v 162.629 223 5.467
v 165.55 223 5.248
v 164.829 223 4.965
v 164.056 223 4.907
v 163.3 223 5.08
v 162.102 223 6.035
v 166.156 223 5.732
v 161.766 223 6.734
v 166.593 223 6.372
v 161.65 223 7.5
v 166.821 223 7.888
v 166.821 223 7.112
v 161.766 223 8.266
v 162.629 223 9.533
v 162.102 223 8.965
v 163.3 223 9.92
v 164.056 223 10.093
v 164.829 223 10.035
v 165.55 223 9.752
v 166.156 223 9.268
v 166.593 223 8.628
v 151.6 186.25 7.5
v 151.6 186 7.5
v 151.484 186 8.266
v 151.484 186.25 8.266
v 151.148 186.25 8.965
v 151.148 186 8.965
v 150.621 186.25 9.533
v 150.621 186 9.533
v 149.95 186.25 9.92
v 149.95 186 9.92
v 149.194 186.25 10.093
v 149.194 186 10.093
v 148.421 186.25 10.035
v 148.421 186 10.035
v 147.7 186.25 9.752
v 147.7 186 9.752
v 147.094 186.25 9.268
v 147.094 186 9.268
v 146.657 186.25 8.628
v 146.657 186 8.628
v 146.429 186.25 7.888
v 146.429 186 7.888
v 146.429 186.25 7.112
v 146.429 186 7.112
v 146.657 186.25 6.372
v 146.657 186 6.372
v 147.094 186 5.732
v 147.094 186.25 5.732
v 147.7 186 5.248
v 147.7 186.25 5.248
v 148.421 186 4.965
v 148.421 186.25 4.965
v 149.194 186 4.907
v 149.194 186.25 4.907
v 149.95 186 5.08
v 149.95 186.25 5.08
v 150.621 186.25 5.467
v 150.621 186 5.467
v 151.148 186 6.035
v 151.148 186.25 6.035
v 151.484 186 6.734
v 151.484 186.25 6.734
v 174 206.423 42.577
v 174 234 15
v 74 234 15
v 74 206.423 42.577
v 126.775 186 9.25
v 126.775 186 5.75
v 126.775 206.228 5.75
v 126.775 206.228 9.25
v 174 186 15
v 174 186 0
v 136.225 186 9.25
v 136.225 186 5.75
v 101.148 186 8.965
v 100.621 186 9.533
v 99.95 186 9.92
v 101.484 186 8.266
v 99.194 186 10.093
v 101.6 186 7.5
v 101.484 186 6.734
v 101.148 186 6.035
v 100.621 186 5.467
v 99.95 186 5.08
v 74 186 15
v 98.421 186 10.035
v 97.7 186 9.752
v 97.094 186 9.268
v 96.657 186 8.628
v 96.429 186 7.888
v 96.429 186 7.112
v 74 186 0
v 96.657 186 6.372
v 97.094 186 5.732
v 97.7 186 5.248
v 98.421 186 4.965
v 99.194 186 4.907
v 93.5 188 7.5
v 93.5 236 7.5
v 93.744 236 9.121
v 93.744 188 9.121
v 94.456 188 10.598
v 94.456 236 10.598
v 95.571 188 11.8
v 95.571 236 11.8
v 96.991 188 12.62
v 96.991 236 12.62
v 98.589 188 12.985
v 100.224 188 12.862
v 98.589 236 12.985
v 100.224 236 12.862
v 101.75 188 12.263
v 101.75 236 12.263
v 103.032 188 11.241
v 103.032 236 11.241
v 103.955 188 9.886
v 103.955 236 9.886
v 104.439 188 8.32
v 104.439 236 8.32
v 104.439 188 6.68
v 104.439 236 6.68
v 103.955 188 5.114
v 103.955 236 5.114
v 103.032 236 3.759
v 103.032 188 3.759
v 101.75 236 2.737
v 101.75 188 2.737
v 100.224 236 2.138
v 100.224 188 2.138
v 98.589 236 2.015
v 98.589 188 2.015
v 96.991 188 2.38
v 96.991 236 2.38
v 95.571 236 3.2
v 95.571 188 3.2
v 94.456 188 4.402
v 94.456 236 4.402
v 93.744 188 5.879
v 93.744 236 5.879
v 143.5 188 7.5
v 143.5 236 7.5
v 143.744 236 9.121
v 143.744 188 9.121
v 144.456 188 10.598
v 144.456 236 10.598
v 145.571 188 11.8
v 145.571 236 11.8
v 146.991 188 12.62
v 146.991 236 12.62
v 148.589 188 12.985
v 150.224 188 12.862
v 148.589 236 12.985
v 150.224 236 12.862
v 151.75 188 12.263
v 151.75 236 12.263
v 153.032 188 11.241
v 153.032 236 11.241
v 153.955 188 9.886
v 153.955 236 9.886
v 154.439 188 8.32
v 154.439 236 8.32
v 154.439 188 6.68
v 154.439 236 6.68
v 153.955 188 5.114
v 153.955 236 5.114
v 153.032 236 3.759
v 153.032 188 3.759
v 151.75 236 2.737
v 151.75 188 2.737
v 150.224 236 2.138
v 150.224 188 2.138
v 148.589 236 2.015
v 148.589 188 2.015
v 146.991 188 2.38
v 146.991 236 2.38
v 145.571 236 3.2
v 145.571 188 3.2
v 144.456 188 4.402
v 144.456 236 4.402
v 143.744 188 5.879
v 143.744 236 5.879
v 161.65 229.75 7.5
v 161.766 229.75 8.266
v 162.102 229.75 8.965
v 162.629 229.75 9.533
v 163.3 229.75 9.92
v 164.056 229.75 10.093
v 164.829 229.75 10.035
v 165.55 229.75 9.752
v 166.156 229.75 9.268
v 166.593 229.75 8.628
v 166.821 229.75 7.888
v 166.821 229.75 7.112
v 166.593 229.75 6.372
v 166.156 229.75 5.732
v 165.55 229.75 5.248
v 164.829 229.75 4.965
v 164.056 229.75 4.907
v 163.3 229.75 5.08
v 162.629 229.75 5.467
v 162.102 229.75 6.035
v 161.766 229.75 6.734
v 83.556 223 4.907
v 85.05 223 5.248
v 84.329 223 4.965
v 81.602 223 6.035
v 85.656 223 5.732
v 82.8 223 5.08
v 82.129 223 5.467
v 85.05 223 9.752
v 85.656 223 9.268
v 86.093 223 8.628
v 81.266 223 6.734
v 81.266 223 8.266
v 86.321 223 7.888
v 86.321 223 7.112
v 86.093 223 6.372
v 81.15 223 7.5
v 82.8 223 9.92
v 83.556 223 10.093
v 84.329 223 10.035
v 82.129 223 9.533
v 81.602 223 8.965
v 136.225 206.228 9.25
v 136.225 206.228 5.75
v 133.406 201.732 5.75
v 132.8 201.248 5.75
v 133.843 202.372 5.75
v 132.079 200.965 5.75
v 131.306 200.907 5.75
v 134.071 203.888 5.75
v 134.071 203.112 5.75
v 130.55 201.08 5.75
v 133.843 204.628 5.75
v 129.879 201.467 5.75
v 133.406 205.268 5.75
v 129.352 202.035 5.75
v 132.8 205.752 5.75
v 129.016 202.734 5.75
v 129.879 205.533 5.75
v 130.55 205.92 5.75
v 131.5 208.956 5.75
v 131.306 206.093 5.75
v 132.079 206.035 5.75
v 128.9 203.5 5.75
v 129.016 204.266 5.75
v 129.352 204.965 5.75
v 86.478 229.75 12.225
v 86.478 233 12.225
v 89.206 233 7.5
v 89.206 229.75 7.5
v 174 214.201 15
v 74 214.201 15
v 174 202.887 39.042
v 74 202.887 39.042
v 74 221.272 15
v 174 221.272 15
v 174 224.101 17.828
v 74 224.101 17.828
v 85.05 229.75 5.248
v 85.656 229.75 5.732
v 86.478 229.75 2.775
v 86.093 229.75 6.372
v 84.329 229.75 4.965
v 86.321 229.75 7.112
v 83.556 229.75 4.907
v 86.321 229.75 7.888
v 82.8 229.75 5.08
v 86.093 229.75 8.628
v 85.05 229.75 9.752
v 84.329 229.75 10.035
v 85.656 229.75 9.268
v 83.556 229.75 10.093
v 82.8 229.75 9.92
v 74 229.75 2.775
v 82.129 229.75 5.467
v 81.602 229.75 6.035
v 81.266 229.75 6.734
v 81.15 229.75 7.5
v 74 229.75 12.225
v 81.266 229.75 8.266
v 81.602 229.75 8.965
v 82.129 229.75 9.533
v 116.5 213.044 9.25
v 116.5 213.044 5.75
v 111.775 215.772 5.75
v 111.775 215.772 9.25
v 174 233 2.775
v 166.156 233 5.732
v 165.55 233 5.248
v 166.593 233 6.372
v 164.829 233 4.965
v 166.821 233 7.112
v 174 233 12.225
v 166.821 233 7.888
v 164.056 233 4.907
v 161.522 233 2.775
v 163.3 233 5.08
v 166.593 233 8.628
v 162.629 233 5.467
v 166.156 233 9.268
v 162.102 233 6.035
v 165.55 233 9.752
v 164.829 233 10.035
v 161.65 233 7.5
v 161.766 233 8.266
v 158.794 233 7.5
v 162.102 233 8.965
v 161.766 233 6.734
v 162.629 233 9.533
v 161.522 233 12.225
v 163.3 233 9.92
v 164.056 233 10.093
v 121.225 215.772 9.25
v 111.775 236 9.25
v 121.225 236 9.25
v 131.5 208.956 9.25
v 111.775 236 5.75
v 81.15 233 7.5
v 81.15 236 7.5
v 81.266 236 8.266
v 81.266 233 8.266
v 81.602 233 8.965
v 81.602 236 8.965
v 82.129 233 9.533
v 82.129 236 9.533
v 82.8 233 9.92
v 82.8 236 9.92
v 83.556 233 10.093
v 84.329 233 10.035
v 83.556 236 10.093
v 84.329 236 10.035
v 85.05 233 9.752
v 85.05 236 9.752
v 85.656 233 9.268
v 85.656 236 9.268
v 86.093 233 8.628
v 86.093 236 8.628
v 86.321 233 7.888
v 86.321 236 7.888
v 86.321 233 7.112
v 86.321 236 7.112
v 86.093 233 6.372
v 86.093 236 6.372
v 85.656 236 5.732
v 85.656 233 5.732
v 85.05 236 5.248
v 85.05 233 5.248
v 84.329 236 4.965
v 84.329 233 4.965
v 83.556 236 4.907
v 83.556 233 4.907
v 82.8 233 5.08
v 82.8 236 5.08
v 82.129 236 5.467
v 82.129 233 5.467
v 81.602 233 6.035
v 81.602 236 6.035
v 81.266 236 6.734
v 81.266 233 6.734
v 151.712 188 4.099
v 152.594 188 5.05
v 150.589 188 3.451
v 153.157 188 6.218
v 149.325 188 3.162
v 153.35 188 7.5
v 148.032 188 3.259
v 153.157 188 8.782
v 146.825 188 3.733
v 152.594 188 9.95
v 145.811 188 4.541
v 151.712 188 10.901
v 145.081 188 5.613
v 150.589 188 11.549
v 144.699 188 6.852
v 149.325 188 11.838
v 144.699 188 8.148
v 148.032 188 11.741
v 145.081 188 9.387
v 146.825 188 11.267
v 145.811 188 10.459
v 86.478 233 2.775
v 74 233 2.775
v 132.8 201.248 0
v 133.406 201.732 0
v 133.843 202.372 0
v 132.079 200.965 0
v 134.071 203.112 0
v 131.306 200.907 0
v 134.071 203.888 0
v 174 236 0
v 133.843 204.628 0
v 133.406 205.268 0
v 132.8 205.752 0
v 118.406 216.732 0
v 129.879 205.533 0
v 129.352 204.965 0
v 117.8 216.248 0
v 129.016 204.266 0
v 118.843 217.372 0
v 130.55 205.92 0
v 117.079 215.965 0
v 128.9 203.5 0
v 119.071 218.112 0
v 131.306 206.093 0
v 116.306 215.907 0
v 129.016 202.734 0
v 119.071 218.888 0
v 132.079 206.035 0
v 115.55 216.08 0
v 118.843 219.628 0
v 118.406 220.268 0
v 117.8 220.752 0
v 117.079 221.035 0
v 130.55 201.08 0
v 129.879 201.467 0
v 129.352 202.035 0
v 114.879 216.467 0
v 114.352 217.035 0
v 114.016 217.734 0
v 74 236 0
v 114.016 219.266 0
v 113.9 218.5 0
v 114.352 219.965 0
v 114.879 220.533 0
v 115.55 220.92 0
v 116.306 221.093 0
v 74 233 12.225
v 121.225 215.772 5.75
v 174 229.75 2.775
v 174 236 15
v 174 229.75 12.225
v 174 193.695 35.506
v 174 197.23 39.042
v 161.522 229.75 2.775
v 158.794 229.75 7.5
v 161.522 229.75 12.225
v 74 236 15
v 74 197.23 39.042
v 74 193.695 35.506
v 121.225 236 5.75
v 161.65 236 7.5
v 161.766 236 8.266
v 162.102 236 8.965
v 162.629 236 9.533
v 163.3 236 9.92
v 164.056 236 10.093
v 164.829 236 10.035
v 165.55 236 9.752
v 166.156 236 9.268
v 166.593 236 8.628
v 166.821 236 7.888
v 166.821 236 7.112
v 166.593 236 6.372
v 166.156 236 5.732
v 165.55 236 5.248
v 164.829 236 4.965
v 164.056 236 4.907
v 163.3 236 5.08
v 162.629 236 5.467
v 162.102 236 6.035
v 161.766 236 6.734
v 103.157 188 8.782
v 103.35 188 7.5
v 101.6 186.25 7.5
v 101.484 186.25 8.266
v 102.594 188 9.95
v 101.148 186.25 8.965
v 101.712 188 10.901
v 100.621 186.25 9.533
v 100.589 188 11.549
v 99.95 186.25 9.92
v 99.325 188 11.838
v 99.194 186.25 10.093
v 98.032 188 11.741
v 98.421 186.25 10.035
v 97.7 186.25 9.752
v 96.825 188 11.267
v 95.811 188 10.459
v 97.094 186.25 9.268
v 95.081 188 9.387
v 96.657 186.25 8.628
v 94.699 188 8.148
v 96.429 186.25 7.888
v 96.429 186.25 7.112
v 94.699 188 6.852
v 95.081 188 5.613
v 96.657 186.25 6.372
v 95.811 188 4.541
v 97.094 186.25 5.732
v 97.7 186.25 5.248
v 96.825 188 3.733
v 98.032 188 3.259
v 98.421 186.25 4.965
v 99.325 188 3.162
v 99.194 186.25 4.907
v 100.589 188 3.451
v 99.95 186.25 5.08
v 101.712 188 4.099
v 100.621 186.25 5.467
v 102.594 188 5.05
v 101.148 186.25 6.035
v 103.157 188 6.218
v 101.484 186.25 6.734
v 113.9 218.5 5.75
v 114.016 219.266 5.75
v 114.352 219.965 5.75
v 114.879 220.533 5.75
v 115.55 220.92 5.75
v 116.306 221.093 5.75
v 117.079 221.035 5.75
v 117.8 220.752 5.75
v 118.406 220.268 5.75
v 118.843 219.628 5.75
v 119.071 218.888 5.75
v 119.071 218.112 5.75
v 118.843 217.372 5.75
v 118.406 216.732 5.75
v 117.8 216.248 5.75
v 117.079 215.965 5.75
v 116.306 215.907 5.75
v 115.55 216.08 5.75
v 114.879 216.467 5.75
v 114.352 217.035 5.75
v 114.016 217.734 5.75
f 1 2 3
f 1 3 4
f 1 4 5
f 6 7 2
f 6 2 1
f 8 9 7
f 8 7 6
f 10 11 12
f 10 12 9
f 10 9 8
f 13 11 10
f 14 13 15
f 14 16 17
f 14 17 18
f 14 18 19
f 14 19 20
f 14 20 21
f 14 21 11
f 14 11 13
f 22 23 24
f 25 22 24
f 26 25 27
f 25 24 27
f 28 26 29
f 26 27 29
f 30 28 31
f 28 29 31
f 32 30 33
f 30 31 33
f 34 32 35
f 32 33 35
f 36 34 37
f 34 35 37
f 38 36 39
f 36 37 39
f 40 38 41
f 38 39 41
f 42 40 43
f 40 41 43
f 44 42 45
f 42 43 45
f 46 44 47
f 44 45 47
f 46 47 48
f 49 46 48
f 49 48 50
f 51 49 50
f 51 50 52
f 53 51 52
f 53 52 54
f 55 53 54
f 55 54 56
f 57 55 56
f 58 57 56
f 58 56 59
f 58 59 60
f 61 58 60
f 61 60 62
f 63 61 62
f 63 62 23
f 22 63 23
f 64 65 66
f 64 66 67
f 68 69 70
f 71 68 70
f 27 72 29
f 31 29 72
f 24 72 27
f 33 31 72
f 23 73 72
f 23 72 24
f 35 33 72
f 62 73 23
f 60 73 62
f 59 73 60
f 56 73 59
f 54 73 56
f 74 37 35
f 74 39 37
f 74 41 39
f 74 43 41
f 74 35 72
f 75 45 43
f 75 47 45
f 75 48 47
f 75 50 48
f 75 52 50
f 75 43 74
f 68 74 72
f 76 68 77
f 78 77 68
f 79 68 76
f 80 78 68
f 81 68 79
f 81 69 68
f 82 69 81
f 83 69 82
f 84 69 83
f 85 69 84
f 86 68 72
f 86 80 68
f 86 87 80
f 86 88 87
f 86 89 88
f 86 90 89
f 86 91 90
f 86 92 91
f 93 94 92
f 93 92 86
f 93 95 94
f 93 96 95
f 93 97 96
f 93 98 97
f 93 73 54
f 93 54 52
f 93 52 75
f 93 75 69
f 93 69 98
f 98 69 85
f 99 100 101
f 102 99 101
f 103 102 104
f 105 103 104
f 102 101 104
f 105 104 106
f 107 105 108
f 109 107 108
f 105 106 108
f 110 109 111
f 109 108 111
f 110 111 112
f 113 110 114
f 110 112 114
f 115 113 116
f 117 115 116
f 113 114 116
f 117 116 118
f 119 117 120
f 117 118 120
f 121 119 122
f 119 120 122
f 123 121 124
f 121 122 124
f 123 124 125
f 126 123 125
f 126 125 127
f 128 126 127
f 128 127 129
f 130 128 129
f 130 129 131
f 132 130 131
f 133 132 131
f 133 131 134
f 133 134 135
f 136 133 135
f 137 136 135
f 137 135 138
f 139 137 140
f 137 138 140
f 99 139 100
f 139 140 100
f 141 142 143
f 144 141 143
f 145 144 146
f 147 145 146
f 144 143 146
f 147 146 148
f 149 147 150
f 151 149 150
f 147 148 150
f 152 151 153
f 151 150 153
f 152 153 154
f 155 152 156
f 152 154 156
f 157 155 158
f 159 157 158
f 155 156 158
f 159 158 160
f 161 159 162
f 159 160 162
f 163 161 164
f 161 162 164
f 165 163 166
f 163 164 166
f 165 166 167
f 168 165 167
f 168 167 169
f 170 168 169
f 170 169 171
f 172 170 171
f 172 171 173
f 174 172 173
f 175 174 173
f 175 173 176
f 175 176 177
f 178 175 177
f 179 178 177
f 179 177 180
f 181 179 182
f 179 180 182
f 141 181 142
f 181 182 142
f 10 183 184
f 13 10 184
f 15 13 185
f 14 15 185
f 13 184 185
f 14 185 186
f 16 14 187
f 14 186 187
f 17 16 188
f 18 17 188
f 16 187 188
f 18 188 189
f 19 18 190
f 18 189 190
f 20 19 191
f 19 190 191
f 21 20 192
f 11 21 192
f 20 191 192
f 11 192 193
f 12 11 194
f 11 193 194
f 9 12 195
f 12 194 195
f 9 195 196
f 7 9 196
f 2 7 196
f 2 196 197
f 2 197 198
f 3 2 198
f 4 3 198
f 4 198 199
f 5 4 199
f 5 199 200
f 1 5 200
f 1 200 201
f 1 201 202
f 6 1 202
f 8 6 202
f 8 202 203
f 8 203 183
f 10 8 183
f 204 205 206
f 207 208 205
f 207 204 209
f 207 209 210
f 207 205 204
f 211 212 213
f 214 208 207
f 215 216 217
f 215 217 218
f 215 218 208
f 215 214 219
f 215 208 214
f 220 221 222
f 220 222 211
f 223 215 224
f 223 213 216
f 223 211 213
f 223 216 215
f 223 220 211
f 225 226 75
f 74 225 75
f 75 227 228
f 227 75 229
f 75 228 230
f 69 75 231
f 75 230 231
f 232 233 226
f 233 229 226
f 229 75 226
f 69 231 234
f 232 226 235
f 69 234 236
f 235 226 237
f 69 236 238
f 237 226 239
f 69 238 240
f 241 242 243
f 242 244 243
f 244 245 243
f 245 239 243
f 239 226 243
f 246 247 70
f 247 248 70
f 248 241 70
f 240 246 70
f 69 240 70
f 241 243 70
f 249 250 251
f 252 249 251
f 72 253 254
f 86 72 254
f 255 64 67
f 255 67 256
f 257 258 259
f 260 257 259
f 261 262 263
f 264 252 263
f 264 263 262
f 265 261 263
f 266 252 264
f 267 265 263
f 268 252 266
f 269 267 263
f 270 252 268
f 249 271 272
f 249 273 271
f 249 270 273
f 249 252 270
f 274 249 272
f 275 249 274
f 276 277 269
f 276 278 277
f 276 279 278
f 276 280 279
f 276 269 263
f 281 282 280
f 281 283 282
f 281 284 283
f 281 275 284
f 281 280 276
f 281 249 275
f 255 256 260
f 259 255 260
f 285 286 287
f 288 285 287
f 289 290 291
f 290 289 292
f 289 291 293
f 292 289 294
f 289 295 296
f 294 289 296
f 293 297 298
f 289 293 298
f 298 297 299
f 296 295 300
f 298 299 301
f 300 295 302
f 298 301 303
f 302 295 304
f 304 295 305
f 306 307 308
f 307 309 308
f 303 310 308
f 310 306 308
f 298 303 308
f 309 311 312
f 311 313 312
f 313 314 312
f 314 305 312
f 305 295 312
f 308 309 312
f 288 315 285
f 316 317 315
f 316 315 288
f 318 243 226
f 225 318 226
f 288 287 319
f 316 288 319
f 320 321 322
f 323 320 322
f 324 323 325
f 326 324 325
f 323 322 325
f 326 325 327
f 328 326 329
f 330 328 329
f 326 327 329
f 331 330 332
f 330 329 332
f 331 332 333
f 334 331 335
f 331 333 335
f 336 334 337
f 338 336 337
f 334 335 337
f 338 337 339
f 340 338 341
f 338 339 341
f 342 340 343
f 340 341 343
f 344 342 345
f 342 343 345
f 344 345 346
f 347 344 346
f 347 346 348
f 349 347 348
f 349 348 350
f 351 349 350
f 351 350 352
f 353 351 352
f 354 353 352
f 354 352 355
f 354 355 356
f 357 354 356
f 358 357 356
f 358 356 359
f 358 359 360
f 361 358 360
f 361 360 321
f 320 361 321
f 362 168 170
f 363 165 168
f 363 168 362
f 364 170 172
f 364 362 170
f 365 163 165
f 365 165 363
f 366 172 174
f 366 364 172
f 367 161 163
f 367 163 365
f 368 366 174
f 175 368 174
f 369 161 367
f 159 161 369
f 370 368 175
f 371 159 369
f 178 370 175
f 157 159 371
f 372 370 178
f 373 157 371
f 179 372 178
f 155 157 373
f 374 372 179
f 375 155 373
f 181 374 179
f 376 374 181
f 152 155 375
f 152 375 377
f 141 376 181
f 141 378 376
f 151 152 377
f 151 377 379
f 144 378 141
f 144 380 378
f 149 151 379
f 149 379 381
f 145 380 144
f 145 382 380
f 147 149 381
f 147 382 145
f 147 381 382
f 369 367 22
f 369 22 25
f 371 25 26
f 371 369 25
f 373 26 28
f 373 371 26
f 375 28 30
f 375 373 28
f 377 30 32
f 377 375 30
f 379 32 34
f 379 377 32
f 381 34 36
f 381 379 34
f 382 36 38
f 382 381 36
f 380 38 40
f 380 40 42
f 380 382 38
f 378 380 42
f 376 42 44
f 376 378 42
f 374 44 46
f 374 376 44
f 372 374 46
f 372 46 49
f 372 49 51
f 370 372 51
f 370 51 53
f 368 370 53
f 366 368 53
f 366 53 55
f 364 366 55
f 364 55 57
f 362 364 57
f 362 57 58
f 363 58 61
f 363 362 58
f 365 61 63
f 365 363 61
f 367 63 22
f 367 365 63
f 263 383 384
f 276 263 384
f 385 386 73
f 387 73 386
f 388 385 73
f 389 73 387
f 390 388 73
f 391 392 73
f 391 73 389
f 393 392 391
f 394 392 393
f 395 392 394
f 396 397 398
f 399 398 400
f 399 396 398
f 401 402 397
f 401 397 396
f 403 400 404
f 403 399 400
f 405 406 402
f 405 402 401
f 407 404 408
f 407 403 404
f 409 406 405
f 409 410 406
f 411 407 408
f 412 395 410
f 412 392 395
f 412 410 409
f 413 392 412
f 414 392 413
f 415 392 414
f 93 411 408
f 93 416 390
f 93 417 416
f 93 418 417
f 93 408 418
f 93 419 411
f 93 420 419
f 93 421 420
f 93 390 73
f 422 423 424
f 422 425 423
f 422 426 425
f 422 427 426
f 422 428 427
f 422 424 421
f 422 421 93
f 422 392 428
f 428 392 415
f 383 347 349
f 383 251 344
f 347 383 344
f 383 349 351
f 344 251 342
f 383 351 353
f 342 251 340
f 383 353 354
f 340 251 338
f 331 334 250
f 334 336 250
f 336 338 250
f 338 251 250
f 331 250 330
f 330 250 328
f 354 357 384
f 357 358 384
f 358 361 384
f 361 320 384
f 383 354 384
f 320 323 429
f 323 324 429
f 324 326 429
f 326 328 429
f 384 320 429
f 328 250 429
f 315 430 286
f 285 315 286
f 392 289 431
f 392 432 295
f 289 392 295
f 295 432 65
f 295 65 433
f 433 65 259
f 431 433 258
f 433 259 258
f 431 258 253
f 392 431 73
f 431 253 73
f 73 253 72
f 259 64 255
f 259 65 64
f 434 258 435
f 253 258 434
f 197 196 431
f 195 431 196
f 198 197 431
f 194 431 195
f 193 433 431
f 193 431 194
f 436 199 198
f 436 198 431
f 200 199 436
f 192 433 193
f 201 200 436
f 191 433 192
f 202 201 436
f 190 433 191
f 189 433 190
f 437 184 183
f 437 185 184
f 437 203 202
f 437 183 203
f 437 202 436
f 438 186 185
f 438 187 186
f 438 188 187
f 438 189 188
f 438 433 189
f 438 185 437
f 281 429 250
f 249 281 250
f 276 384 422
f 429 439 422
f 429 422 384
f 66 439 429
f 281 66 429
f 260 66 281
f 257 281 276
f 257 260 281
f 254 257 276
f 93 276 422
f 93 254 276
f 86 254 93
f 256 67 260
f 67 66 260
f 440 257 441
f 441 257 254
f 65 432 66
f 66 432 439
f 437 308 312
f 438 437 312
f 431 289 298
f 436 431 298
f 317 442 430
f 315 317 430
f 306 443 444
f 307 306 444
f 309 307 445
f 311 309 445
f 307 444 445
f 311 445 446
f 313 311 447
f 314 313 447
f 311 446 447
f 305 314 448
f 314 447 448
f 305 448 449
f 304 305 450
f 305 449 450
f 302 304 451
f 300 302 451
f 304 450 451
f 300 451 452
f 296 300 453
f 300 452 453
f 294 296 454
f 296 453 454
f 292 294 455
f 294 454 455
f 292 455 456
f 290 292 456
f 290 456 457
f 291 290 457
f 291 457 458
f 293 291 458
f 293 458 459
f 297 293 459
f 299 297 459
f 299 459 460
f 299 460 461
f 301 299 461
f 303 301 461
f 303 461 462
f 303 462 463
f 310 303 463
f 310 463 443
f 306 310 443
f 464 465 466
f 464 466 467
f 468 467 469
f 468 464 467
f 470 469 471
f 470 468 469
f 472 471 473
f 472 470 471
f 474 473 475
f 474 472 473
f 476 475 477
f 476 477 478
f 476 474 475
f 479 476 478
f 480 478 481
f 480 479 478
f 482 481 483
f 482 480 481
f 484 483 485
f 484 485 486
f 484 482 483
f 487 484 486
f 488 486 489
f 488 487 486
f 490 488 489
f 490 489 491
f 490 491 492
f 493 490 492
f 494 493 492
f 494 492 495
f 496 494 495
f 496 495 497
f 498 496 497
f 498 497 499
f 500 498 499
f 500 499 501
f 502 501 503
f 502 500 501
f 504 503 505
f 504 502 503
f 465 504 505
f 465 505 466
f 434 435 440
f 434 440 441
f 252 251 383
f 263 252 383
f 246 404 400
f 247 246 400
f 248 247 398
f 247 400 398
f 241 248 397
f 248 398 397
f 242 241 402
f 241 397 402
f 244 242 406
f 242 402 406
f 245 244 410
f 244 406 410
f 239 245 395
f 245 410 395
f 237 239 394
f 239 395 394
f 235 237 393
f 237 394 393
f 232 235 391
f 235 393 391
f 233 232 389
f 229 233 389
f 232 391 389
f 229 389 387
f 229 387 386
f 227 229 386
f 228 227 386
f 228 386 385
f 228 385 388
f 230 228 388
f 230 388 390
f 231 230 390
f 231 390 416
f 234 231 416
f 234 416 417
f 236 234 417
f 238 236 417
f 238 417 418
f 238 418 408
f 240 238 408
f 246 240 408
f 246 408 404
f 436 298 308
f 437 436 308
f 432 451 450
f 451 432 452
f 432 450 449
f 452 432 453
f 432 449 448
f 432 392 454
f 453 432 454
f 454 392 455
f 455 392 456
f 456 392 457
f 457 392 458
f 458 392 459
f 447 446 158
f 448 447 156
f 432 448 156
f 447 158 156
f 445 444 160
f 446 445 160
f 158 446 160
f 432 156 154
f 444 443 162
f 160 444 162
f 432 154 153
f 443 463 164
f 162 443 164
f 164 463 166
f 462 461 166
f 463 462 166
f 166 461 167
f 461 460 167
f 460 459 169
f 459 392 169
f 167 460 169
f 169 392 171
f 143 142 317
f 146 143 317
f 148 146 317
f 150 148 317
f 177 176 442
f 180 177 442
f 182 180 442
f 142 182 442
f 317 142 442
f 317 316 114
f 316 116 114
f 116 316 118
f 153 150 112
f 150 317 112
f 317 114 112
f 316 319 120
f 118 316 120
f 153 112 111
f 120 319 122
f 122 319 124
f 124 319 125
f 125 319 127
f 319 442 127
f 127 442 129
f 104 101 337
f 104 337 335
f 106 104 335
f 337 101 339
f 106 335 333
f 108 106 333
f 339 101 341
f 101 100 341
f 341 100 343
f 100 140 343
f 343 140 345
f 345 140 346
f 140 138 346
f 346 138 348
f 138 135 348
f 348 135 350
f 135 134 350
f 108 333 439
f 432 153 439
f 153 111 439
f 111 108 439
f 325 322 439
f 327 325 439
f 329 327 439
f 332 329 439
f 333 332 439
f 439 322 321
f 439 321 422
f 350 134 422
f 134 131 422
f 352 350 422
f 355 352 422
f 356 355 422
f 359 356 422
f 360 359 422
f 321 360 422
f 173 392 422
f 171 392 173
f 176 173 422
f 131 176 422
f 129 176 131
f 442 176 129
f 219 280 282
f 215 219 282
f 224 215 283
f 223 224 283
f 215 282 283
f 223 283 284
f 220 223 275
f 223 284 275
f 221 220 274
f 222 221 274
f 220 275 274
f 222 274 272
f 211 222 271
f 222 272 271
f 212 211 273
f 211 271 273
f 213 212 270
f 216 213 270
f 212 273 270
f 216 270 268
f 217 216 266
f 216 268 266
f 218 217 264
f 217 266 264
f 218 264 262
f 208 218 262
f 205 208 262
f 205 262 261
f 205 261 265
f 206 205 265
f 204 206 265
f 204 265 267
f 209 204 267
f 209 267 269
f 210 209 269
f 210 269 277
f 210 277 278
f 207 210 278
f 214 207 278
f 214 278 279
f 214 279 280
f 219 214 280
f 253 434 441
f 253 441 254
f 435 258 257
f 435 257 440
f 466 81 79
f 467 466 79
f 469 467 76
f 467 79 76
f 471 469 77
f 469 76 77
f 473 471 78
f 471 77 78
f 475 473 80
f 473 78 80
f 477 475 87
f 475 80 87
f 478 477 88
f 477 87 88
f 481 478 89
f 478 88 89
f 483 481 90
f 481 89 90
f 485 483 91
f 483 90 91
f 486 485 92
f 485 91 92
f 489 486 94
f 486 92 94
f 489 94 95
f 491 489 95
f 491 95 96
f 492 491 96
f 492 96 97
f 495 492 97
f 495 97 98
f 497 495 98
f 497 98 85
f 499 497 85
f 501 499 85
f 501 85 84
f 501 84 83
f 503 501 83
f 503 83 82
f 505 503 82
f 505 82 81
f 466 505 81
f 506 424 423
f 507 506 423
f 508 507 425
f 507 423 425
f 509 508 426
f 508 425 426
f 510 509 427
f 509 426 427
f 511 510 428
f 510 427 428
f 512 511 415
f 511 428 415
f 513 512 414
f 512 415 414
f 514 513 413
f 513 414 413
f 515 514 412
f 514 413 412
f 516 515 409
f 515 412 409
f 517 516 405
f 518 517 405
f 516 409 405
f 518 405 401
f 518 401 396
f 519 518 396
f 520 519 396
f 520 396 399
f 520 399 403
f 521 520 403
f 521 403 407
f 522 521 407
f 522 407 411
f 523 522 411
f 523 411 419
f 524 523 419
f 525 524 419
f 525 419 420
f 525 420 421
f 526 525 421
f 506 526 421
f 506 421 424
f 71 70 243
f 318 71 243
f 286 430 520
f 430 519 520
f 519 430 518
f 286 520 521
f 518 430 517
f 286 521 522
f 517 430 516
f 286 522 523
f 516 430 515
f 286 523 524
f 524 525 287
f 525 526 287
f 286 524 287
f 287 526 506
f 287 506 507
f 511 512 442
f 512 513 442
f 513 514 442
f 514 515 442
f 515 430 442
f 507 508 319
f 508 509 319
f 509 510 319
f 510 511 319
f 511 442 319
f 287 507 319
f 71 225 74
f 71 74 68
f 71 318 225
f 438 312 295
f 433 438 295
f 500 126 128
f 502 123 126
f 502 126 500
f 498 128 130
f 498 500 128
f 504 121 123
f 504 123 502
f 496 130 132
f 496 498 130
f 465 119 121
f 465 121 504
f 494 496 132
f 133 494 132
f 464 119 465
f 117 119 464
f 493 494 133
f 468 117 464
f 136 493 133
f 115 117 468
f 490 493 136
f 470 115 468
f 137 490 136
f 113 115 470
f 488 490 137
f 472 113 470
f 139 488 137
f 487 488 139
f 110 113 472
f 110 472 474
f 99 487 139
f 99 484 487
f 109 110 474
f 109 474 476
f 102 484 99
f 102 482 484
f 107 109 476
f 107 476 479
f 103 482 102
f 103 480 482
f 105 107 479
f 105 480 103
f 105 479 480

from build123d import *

# Parameters (mm, degrees)
SKETCH011_W     = 100
SKETCH011_H     = 50
PAD003_DEPTH    = 15
PAD004_DEPTH    = 100
SKETCH016_R     = 2.6
POCKET010_DEPTH = 200
PAD005_DEPTH    = 100
SKETCH027_R     = 2.6
POCKET018_DEPTH = 9
POCKET019_START = -5.75
POCKET019_DEPTH = 3.5
SKETCH029_R     = 5.5
POCKET020_DEPTH = 48
CHAMFER002_SIZE = 1.75
SKETCH031_R     = 2.6
POCKET022_DEPTH = 13
POCKET023_START = -3
POCKET023_DEPTH = 3.25


with BuildPart() as part:
    # Sketch011 (on Face1 of ShapeBinder) → Pad003 (new body)
    with BuildSketch(Plane(origin=(248, 180, 0), x_dir=(-1, 0, 0), z_dir=(0, 0, -1))):
        with Locations((124, 31)):
            Rectangle(SKETCH011_W, SKETCH011_H)
    extrude(amount=-PAD003_DEPTH)

    # Sketch012 (on Face5 of Pad003) → Pad004 (join)
    with BuildSketch(Plane(origin=(174, 180, 0), x_dir=(0, 1, 0), z_dir=(1, 0, 0))):
        Polygon((54, 15), (26.422836, 42.577164), (22.887302, 39.041631), (46.928932, 15), align=None)
        Polygon((41.272078, 15), (17.230447, 39.041631), (13.694913, 35.506097), (34.20101, 15), align=None)
    extrude(amount=-PAD004_DEPTH)

    # Sketch016 (on Face1 of Pad004) → Pocket010 (cut)
    with BuildSketch(Plane(origin=(248, 186, 0), x_dir=(1, 0, 0), z_dir=(0, -1, 0))):
        with Locations((-149, 7.5)):
            Circle(SKETCH016_R)
        with Locations((-99, 7.5)):
            Circle(SKETCH016_R)
    extrude(amount=-POCKET010_DEPTH, mode=Mode.SUBTRACT)

    # Sketch017 (on Face3 of Pocket010) → Pad005 (join)
    with BuildSketch(Plane(origin=(174, 180, 0), x_dir=(0, 1, 0), z_dir=(1, 0, 0))):
        Polygon((41.272078, 15), (44.100505, 17.828427), (46.928932, 15), align=None)
    extrude(amount=-PAD005_DEPTH)

    # Sketch027 (on Face2 of Pad005) → Pocket018 (cut)
    with BuildSketch(Plane(origin=(248, 180, 0), x_dir=(-1, 0, 0), z_dir=(0, 0, -1))):
        with Locations((116.5, 23.5)):
            Circle(SKETCH027_R)
        with Locations((131.5, 38.5)):
            Circle(SKETCH027_R)
    extrude(amount=-POCKET018_DEPTH, mode=Mode.SUBTRACT)

    # Sketch028 (on Face2 of Pocket018) → Pocket019 (cut)
    with BuildSketch(Plane(origin=(248, 180, 0), x_dir=(-1, 0, 0), z_dir=(0, 0, -1)).offset(POCKET019_START)):
        Polygon((126.775, 41.22798), (126.775, 35.77202), (131.5, 33.04404), (136.225, 35.77202), (136.225, 41.22798), (136.225, 56), (126.775, 56), align=None)
        Polygon((111.775, 26.22798), (111.775, 20.77202), (111.775, 6), (121.225, 6), (121.225, 20.77202), (121.225, 26.22798), (116.5, 28.95596), align=None)
    extrude(amount=-POCKET019_DEPTH, mode=Mode.SUBTRACT)

    # Sketch029 (on Face12 of Pocket019) → Pocket020 (cut)
    with BuildSketch(Plane(origin=(248, 236, 0), x_dir=(-1, 0, 0), z_dir=(0, 1, 0))):
        with Locations((99, 7.5)):
            Circle(SKETCH029_R)
        with Locations((149, 7.5)):
            Circle(SKETCH029_R)
    extrude(amount=-POCKET020_DEPTH, mode=Mode.SUBTRACT)

    # Chamfer002
    chamfer002_edges = [part.edges().sort_by_distance(p)[0] for p in [
        (146.4, 188, 7.5),
        (96.4, 188, 7.5),
    ]]
    chamfer(chamfer002_edges, length=CHAMFER002_SIZE)

    # Sketch031 (on Face13 of Chamfer002) → Pocket022 (cut)
    with BuildSketch(Plane(origin=(248, 236, 0), x_dir=(-1, 0, 0), z_dir=(0, 1, 0))):
        with Locations((83.75, 7.5)):
            Circle(SKETCH031_R)
        with Locations((164.25, 7.5)):
            Circle(SKETCH031_R)
    extrude(amount=-POCKET022_DEPTH, mode=Mode.SUBTRACT)

    # Sketch032 (on Face15 of Pocket022) → Pocket023 (cut)
    with BuildSketch(Plane(origin=(248, 236, 0), x_dir=(-1, 0, 0), z_dir=(0, 1, 0)).offset(POCKET023_START)):
        Polygon((81.02202, 2.775), (86.47798, 2.775), (89.20596, 7.5), (86.47798, 12.225), (81.02202, 12.225), (74, 12.225), (74, 2.775), align=None)
        Polygon((161.52202, 12.225), (158.79404, 7.5), (161.52202, 2.775), (166.97798, 2.775), (174, 2.775), (174, 12.225), (166.97798, 12.225), align=None)
    extrude(amount=-POCKET023_DEPTH, mode=Mode.SUBTRACT)


solid = part.part
